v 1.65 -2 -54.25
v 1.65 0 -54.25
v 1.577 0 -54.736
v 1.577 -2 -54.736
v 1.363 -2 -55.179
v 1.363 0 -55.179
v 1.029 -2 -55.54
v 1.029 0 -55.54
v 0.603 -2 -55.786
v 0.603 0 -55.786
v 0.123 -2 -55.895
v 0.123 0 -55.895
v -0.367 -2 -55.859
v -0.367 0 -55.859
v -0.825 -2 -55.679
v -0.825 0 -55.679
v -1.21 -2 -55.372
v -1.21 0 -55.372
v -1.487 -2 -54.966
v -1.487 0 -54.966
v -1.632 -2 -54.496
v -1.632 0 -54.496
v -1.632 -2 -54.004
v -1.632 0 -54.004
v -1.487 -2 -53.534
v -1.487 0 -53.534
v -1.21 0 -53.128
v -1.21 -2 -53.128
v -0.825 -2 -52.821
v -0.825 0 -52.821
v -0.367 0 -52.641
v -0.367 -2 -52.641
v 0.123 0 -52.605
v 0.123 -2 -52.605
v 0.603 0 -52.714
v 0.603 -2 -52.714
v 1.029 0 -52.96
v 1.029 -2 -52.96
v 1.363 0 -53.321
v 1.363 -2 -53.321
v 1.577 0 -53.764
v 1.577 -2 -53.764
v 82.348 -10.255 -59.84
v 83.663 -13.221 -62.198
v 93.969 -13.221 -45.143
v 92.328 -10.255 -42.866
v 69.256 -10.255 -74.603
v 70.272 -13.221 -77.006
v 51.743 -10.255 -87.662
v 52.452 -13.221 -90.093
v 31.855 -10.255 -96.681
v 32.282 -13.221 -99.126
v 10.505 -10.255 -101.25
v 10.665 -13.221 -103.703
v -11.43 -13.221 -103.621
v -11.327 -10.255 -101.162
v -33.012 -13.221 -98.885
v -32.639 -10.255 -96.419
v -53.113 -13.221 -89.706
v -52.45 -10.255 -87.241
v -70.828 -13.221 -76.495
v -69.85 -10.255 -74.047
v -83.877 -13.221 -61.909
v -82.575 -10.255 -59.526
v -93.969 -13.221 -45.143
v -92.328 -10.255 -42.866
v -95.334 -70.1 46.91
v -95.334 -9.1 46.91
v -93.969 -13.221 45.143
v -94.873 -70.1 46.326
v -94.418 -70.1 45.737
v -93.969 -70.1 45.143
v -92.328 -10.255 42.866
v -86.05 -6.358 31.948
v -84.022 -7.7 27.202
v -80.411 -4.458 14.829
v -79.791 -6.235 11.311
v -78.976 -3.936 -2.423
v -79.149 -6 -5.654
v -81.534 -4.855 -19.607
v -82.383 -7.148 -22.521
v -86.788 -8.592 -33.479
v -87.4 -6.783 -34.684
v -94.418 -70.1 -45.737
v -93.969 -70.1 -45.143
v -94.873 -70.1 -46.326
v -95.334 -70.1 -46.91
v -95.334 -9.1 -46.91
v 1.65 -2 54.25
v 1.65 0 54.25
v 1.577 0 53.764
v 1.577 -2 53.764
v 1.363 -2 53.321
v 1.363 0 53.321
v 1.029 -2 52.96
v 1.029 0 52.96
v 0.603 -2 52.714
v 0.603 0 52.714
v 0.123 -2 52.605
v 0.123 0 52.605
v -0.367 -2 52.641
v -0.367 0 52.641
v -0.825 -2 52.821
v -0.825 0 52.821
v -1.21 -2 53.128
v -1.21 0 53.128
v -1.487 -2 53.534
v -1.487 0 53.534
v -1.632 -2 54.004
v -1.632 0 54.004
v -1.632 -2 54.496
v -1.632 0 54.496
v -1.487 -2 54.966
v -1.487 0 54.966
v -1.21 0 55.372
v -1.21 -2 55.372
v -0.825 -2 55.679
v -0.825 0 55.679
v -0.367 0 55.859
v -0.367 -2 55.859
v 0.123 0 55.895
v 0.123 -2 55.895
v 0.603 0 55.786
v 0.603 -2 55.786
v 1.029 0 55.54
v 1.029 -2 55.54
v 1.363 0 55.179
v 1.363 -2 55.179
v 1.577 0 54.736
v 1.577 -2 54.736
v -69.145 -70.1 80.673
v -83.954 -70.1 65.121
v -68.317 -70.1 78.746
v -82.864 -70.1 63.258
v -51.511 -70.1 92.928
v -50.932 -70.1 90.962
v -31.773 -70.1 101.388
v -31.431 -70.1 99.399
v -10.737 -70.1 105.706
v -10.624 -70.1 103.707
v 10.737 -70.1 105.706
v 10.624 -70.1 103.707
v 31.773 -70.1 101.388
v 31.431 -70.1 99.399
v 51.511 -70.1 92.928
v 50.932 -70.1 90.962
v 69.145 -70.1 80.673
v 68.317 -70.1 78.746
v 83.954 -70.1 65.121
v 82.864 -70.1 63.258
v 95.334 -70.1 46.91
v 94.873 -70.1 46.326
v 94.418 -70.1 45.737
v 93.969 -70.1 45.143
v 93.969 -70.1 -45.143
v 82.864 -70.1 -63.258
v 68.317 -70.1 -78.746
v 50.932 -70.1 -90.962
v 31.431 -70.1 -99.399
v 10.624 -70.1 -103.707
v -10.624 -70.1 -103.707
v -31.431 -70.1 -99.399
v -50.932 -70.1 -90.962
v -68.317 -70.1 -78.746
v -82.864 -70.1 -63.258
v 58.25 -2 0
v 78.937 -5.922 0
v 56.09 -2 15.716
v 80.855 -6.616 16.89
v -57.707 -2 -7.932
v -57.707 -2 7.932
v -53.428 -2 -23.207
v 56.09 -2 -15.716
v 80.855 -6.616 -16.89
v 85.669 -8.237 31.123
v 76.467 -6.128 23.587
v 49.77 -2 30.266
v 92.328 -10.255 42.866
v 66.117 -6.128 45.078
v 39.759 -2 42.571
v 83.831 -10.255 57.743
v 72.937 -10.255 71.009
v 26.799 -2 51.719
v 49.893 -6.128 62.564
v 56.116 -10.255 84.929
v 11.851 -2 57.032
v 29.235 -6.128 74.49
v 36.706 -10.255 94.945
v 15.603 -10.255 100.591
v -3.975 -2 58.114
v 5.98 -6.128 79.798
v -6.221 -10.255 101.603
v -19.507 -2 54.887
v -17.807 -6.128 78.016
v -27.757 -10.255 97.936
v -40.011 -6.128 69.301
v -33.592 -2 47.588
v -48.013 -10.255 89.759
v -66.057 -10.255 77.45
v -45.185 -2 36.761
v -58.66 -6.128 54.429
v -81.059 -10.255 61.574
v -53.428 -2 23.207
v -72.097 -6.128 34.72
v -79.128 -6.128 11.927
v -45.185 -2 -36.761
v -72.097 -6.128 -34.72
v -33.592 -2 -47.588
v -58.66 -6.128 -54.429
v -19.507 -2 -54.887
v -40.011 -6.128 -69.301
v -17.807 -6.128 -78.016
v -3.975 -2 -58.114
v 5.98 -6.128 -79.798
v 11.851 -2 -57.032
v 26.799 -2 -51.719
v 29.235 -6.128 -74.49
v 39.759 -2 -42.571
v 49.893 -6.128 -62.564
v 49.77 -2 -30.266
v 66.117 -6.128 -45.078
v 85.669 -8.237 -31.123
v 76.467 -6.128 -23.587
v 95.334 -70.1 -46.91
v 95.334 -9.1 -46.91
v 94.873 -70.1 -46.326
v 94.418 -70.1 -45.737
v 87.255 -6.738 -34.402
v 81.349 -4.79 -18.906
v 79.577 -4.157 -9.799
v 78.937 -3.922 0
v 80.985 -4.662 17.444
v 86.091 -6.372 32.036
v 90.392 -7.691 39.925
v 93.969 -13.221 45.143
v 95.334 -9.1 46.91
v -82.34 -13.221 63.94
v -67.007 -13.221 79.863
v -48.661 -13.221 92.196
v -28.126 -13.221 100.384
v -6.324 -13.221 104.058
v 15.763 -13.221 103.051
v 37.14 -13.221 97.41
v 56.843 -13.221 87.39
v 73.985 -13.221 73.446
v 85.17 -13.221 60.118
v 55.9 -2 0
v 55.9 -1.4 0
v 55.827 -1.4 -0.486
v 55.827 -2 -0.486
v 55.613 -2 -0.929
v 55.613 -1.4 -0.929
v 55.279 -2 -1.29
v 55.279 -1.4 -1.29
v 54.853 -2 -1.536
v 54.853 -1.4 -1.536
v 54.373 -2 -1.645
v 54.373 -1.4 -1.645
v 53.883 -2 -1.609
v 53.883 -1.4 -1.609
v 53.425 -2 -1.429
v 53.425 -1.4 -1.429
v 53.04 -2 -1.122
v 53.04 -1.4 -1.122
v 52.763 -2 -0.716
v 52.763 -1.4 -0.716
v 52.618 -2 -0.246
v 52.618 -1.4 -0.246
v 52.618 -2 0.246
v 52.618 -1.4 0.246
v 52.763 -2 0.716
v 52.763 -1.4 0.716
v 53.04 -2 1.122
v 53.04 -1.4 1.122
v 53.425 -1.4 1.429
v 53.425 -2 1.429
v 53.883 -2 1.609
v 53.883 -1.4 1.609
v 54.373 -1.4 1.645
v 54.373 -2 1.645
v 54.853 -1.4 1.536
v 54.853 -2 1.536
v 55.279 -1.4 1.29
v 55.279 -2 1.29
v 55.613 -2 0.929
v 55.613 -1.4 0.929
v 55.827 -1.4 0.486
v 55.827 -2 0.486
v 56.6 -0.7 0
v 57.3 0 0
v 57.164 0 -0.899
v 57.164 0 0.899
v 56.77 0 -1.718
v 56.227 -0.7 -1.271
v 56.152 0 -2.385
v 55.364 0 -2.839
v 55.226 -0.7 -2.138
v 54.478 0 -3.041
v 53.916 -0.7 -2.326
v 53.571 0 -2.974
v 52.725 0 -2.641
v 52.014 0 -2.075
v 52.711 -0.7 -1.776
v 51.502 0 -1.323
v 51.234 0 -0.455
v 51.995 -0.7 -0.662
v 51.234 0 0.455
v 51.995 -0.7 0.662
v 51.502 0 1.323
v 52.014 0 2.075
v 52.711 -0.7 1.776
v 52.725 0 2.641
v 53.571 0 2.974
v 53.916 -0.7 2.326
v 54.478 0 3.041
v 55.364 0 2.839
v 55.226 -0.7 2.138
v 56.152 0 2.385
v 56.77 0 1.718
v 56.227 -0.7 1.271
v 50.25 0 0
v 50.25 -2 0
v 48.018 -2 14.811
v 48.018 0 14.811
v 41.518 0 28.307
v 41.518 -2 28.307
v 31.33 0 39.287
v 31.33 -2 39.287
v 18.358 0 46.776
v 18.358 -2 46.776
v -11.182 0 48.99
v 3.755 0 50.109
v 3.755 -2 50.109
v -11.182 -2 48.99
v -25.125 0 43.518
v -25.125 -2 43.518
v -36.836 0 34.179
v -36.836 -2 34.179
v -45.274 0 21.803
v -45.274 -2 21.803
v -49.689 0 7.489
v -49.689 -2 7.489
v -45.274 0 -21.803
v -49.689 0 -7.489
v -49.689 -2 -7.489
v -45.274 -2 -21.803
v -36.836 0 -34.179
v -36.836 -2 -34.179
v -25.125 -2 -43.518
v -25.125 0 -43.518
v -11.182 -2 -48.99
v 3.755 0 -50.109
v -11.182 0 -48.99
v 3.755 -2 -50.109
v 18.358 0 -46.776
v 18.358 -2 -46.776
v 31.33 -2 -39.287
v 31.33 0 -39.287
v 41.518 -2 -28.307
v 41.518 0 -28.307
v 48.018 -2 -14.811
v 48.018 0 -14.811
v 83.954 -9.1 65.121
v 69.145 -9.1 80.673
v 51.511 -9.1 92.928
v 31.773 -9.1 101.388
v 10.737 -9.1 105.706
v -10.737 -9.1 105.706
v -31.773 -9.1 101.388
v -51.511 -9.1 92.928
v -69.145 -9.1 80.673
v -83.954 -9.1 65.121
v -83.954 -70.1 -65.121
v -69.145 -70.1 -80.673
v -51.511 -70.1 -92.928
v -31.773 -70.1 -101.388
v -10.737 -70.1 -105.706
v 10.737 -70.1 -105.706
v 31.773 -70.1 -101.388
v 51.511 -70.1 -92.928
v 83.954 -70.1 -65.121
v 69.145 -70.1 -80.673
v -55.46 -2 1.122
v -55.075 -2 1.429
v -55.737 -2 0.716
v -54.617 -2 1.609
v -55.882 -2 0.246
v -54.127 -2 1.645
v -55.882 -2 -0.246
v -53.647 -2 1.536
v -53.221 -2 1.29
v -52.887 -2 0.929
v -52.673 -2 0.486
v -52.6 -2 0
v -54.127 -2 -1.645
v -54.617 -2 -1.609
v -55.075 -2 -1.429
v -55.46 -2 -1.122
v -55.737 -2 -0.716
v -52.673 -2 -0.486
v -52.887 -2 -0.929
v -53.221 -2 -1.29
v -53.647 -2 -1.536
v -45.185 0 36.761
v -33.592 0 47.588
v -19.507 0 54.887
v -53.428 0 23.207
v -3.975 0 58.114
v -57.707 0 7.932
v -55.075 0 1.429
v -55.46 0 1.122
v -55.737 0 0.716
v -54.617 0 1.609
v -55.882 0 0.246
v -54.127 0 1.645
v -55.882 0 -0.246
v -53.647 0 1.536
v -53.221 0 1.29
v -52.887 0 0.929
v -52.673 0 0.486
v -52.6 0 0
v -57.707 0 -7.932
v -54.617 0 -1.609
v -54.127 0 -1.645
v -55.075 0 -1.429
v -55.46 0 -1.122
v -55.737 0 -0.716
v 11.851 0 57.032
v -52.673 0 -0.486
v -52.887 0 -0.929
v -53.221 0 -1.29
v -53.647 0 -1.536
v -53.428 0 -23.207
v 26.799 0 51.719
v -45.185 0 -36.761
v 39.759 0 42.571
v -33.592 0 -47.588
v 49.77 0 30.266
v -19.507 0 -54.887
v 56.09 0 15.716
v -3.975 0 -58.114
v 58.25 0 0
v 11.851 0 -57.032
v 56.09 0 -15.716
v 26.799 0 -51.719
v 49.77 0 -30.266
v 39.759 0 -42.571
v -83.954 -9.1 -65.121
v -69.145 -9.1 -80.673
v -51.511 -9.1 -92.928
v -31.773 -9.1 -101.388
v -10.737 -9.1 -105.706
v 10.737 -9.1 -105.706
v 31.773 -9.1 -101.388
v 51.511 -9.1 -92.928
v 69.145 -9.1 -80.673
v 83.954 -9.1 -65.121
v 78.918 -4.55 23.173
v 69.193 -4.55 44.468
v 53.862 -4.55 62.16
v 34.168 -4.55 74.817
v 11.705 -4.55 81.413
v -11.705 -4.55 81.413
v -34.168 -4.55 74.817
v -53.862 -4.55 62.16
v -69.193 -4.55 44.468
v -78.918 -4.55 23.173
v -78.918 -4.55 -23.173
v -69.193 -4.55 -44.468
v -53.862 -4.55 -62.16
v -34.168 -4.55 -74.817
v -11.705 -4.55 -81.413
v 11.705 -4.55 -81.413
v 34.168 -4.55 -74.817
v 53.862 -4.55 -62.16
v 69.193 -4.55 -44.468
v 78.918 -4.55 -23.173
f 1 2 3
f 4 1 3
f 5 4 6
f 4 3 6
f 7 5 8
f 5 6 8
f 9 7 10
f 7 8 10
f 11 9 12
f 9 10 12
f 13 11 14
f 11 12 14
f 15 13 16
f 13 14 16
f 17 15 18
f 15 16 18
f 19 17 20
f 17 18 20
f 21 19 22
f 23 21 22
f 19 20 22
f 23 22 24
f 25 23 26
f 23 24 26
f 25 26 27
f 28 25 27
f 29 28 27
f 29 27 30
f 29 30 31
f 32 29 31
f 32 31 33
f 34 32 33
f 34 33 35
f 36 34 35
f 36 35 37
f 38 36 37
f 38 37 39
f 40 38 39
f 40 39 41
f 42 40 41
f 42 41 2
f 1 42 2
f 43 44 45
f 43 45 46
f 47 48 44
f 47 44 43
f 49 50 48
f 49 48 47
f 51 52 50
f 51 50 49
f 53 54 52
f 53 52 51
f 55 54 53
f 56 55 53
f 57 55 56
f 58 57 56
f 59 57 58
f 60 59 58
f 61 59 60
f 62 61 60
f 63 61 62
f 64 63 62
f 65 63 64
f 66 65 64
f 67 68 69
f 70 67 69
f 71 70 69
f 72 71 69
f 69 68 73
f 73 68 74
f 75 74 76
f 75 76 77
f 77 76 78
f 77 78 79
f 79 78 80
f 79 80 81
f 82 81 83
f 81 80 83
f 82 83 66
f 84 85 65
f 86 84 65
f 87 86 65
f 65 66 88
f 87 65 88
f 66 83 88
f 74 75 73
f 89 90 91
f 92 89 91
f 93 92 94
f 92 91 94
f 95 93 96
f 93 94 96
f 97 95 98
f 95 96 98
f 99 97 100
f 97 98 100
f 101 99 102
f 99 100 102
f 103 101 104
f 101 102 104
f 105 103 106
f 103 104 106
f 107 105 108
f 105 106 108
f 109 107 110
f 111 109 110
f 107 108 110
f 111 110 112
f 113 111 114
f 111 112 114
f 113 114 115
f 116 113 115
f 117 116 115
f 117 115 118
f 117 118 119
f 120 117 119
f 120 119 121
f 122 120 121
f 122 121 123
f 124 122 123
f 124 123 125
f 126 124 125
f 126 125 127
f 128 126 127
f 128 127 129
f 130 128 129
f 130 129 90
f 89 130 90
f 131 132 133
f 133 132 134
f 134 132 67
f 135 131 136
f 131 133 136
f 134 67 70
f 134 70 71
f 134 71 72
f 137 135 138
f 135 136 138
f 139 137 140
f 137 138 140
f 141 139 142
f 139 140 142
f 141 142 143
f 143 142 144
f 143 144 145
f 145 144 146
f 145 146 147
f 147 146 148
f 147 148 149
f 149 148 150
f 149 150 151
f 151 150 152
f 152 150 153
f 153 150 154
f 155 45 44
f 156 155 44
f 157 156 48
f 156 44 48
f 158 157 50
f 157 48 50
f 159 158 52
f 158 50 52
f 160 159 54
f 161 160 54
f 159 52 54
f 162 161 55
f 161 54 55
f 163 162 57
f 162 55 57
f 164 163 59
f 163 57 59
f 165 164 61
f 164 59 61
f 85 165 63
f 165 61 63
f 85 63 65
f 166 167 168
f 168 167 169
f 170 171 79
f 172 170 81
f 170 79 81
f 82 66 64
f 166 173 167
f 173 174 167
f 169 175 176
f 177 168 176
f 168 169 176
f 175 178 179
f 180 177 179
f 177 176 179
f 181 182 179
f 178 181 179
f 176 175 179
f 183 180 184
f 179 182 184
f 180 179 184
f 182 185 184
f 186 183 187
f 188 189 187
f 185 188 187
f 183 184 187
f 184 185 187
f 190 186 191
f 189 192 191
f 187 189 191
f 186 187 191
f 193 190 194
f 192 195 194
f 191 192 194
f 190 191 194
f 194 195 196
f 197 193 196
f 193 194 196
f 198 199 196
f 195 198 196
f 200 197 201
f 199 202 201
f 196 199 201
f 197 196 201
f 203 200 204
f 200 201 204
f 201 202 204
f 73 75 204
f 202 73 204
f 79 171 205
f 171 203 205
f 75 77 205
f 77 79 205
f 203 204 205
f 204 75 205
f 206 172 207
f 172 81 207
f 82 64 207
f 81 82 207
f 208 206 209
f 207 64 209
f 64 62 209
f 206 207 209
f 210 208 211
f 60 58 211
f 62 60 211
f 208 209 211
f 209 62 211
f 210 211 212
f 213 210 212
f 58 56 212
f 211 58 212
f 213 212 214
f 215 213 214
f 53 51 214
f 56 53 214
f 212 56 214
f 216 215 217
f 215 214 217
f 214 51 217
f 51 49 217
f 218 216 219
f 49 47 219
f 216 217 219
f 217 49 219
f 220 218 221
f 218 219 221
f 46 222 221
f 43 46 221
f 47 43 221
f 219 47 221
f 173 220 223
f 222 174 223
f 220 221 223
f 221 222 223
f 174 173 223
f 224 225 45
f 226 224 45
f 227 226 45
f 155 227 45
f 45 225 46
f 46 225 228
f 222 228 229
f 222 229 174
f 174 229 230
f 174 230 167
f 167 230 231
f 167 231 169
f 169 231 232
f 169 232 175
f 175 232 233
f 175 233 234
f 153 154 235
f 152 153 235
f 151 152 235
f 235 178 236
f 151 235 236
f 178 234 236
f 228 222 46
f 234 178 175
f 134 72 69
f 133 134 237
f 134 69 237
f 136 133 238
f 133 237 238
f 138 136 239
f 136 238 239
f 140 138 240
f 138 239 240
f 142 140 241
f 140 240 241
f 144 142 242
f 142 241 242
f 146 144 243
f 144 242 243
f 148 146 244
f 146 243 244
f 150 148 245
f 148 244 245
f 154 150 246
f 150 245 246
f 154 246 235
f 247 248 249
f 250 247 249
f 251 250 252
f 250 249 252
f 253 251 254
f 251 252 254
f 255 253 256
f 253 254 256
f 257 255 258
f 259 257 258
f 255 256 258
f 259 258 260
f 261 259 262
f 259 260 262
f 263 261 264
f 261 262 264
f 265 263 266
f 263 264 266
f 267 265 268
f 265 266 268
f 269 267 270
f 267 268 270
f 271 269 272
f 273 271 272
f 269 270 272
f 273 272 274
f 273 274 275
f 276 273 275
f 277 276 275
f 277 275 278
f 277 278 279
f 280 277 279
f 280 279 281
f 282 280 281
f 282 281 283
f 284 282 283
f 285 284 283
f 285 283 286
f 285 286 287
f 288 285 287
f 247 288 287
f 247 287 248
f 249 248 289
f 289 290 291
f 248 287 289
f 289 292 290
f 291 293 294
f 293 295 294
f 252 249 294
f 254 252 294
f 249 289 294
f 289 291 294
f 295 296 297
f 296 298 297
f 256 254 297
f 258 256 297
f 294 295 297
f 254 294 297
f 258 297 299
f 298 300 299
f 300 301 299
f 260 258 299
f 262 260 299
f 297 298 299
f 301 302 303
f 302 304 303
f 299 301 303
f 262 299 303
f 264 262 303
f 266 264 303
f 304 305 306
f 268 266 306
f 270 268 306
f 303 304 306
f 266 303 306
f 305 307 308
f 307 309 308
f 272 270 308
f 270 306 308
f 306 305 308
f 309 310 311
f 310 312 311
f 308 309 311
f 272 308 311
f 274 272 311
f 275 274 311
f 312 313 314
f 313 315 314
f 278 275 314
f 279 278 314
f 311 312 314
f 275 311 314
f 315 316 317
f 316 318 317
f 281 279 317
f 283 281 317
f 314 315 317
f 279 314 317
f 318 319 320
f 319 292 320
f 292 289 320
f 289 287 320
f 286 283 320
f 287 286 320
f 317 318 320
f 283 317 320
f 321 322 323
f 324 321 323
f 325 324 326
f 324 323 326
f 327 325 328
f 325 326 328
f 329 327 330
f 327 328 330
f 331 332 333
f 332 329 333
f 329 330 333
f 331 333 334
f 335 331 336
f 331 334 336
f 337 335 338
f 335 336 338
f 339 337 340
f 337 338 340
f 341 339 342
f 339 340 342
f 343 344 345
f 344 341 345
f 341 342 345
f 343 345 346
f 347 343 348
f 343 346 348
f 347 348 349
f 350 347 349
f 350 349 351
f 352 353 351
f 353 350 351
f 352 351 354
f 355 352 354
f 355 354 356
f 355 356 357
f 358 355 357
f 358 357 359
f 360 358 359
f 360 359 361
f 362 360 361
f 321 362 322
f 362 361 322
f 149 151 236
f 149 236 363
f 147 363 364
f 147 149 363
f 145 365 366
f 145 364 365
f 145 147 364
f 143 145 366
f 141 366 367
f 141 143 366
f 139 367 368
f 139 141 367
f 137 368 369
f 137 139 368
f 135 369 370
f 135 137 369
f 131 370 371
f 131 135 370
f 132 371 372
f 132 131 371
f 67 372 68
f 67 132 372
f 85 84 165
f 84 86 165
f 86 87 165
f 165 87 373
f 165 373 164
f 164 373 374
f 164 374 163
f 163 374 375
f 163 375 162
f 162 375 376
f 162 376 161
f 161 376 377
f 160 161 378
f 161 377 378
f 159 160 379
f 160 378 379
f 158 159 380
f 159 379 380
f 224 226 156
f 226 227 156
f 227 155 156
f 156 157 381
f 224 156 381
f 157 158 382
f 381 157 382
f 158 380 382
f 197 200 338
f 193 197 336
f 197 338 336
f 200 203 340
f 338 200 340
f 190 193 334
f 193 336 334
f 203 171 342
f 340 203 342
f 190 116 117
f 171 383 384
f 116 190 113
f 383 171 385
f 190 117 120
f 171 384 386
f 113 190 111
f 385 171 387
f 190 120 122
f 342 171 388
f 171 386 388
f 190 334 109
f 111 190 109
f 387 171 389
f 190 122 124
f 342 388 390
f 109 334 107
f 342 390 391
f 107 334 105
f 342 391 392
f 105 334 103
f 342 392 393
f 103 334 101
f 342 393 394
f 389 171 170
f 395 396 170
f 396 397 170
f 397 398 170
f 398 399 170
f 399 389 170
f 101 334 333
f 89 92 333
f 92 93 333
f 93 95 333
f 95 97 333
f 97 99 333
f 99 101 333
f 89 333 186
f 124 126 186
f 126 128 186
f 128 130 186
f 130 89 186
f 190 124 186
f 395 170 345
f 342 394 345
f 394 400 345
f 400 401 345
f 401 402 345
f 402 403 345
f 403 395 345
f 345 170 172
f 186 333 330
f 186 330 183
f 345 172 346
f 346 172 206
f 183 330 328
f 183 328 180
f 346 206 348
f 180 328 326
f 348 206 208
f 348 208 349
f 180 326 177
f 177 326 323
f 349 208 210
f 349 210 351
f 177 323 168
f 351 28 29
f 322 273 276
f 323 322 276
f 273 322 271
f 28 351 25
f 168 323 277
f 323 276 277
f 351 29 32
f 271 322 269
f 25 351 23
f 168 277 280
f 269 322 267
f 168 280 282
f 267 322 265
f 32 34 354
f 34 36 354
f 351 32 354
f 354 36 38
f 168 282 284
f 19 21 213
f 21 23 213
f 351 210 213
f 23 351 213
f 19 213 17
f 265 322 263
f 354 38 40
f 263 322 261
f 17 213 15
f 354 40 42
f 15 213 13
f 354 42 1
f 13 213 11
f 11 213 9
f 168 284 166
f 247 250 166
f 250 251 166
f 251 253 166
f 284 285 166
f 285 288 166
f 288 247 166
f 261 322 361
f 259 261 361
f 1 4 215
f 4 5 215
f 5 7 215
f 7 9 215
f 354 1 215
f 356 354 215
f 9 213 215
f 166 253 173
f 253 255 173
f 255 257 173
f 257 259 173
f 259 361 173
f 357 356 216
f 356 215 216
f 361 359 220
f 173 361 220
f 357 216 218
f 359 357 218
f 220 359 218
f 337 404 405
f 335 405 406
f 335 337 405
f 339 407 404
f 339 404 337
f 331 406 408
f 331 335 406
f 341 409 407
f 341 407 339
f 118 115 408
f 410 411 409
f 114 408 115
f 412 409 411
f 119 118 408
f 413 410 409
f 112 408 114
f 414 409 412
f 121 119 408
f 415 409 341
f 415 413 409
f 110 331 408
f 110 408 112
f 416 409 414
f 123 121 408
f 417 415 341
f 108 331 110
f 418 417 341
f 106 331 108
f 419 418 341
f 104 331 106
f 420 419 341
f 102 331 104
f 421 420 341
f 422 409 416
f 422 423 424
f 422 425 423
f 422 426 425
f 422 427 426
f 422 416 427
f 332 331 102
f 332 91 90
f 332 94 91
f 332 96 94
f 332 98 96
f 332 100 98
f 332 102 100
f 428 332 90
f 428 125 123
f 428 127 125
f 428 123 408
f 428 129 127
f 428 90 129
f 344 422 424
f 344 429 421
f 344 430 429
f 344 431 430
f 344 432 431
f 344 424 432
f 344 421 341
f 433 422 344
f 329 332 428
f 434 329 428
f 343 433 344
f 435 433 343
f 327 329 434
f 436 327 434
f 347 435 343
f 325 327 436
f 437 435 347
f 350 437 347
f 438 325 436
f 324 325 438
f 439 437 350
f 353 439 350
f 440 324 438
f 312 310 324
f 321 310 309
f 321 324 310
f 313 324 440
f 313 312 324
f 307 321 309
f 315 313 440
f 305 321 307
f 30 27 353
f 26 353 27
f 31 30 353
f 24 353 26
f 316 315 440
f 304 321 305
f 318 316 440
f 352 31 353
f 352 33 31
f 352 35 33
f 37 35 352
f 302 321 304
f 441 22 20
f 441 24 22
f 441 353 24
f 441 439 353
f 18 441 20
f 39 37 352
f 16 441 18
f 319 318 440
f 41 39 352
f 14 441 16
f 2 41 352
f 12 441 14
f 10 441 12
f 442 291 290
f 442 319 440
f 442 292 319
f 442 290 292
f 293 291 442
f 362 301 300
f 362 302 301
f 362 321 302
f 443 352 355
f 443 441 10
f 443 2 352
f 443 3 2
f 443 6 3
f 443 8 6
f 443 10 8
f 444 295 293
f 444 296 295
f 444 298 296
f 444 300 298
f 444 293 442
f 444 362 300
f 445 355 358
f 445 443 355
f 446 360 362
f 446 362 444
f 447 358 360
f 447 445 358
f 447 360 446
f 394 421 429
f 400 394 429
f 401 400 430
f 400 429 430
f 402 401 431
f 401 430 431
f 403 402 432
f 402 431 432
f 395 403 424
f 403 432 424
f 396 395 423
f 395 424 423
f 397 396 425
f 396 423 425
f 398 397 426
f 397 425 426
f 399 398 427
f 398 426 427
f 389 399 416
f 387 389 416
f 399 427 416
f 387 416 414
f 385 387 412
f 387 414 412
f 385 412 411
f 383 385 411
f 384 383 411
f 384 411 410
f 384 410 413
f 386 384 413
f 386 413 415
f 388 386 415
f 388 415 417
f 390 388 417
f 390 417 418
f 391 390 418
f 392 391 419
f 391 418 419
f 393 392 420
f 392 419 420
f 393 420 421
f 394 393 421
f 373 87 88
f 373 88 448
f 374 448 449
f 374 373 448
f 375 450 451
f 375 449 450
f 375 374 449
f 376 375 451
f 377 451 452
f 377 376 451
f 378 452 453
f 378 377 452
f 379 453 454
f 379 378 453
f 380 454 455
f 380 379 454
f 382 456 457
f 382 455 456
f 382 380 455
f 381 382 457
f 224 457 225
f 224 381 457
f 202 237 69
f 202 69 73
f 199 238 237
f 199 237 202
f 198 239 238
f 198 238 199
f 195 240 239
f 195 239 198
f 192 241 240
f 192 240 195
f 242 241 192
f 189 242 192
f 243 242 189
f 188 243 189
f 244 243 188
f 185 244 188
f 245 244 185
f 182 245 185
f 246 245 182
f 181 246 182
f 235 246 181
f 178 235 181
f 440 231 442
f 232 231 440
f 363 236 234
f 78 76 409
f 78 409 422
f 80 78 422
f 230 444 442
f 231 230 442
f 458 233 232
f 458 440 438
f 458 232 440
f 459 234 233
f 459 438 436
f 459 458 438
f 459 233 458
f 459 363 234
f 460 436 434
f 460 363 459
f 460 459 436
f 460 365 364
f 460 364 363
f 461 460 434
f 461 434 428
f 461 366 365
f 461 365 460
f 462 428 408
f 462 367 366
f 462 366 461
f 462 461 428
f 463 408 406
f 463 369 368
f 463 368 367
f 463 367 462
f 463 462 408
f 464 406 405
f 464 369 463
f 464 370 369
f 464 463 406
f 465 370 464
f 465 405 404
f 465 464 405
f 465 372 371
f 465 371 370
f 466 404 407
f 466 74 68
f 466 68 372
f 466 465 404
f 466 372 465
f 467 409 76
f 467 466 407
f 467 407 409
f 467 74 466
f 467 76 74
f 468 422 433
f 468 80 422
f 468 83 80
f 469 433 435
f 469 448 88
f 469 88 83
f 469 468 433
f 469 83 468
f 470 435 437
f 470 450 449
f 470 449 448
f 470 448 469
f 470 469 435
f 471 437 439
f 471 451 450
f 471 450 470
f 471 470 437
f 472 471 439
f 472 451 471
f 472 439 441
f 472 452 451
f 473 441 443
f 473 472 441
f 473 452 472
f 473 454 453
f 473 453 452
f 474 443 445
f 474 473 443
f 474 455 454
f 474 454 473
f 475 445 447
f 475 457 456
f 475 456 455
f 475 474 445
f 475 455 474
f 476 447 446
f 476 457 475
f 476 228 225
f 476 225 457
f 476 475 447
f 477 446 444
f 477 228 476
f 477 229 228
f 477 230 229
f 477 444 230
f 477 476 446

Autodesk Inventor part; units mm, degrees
ref_plane "YZ Plane" through (0, 0, 0) normal (1, 0, 0) x (0, 1, 0)
ref_plane "XZ Plane" through (0, 0, 0) normal (0, 1, 0) x (-1, 0, 0)
ref_plane "XY Plane" through (0, 0, 0) normal (0, 0, 1) x (1, 0, 0)
sketch "Эскиз1" plane through (0, 0, 0) normal (0, 1, 0) x (-1, 0, 0)
  circle A0 centre (0, 0) radius 106.25
  arc A1 (-95.3337, -46.91) -> (-95.3337, 46.91) centre (-154.2365, 0) ccw
  arc A2 (95.3337, 46.91) -> (95.3337, -46.91) centre (154.2365, 0) ccw
  line L0 (-154.2365, 0) -> (154.2365, 0)
  line L1 (-95.3337, 46.91) -> (-55.3337, 46.91) construction
  line L2 (95.3337, 46.91) -> (55.3337, 46.91) construction
  point P0 (74.5593, -32.2924)
  dimension "d5" = 212.5
  dimension "d16" = 75.3
  dimension "d17" = 75.3
  dimension "d18" = 93.82
  dimension "d19" = 40
  dimension "d20" = 93.82
sketch "Эскиз2" plane through (0, 0, 0) normal (0, 0, 1) x (1, 0, 0)
  line L0 (106.25, 0) -> (-106.25, 0) projected
  line L1 (106.25, 0) -> (106.25, -70.1)
  line L2 (106.25, -9.1) -> (108.25, -9.1) construction
  line L3 (-149.15, 0) -> (151.15, 0) projected
  line L4 (106.25, -70.1) -> (104.25, -70.1)
  line L5 (104.25, -70.1) -> (104.25, -10.7208)
  line L6 (106.25, -9.1) -> (58.25, 0)
  line L7 (104.25, -10.7208) -> (58.25, -2)
  line L8 (58.25, -2) -> (58.25, 0) construction
  line L9 (50.25, 0) -> (58.25, 0)
  line L10 (50.25, 0) -> (50.25, -2)
  line L11 (50.25, -2) -> (58.25, -2)
  line L12 (0, -84.12) -> (0, 14.02) projected
  point P0 (0, 0)
  dimension "d0" = 70.1
  dimension "d1" = 61
  dimension "d7" = 2
  dimension "d10" = 50.25
  dimension "d11" = 8
  dimension "d34" = 2
  dimension "d35" = 1.965
revolve "Вращение1" add sketch "Эскиз2" angle 360 about axis through (0, -10, 0) along (0, 1, 0) contours L6 L1 L4 L5 L7 L11 L10 L0
chamfer "Фаска1" distance 2.5 angle 45 1 edges at (-104.25, -10.7208, 0)
extrude "Выдавливание1" cut sketch "Эскиз1" against normal through all contours L0 A2 A0 | A0 A2 L0 | A1 L0 A0 | A0 L0 A1
sketch "Эскиз3" plane through (0, 0, 0) normal (0, 1, 0) x (1, 0, 0)
  line L0 (148.75, 0) -> (-148.75, 0) construction
  line L1 (0, 148.75) -> (0, -148.75) construction
  circle A0 centre (0, 0) radius 50.25 projected
  circle A1 centre (0, 0) radius 58.25 projected
  circle A2 centre (0, 0) radius 54.25 construction
  circle A3 centre (-54.25, 0) radius 1.65
  circle A4 centre (0, 54.25) radius 1.65
  circle A5 centre (54.25, 0) radius 1.65
  circle A6 centre (0, -54.25) radius 1.65
  point P0 (-50.25, 0)
  point P1 (-58.25, 0)
  dimension "d23" = 8
  dimension "d24" = 4
  dimension "d25" = 3.3
  dimension "d26" = 3.3
  dimension "d27" = 3.3
  dimension "d28" = 3.3
extrude "Выдавливание2" cut sketch "Эскиз3" against normal blind 10 contours A3 | A4 | A5 | A6
sketch "Эскиз4" plane through (0, 0, 0) normal (0, 1, 0) x (1, 0, 0)
  circle A0 centre (54.25, 0) radius 1.65 projected
  circle A1 centre (-54.25, 0) radius 1.65 projected
  circle A2 centre (0, -54.25) radius 1.65 projected
  circle A3 centre (0, 54.25) radius 1.65 projected
  circle A4 centre (0, 0) radius 50.25 projected
  circle A5 centre (0, 0) radius 58.25 projected
chamfer "Фаска2" distance 1.4 angle 45 1 edges at (52.6, 0, 0)
equation "\"d17\" = d16"
equation "\"d20\" = d18"
equation "\"d24\" = 0.5 * d23"
equation "\"d26\" = d25"
equation "\"d27\" = d25"
equation "\"d28\" = d25"
properties part number "main_protect2"
